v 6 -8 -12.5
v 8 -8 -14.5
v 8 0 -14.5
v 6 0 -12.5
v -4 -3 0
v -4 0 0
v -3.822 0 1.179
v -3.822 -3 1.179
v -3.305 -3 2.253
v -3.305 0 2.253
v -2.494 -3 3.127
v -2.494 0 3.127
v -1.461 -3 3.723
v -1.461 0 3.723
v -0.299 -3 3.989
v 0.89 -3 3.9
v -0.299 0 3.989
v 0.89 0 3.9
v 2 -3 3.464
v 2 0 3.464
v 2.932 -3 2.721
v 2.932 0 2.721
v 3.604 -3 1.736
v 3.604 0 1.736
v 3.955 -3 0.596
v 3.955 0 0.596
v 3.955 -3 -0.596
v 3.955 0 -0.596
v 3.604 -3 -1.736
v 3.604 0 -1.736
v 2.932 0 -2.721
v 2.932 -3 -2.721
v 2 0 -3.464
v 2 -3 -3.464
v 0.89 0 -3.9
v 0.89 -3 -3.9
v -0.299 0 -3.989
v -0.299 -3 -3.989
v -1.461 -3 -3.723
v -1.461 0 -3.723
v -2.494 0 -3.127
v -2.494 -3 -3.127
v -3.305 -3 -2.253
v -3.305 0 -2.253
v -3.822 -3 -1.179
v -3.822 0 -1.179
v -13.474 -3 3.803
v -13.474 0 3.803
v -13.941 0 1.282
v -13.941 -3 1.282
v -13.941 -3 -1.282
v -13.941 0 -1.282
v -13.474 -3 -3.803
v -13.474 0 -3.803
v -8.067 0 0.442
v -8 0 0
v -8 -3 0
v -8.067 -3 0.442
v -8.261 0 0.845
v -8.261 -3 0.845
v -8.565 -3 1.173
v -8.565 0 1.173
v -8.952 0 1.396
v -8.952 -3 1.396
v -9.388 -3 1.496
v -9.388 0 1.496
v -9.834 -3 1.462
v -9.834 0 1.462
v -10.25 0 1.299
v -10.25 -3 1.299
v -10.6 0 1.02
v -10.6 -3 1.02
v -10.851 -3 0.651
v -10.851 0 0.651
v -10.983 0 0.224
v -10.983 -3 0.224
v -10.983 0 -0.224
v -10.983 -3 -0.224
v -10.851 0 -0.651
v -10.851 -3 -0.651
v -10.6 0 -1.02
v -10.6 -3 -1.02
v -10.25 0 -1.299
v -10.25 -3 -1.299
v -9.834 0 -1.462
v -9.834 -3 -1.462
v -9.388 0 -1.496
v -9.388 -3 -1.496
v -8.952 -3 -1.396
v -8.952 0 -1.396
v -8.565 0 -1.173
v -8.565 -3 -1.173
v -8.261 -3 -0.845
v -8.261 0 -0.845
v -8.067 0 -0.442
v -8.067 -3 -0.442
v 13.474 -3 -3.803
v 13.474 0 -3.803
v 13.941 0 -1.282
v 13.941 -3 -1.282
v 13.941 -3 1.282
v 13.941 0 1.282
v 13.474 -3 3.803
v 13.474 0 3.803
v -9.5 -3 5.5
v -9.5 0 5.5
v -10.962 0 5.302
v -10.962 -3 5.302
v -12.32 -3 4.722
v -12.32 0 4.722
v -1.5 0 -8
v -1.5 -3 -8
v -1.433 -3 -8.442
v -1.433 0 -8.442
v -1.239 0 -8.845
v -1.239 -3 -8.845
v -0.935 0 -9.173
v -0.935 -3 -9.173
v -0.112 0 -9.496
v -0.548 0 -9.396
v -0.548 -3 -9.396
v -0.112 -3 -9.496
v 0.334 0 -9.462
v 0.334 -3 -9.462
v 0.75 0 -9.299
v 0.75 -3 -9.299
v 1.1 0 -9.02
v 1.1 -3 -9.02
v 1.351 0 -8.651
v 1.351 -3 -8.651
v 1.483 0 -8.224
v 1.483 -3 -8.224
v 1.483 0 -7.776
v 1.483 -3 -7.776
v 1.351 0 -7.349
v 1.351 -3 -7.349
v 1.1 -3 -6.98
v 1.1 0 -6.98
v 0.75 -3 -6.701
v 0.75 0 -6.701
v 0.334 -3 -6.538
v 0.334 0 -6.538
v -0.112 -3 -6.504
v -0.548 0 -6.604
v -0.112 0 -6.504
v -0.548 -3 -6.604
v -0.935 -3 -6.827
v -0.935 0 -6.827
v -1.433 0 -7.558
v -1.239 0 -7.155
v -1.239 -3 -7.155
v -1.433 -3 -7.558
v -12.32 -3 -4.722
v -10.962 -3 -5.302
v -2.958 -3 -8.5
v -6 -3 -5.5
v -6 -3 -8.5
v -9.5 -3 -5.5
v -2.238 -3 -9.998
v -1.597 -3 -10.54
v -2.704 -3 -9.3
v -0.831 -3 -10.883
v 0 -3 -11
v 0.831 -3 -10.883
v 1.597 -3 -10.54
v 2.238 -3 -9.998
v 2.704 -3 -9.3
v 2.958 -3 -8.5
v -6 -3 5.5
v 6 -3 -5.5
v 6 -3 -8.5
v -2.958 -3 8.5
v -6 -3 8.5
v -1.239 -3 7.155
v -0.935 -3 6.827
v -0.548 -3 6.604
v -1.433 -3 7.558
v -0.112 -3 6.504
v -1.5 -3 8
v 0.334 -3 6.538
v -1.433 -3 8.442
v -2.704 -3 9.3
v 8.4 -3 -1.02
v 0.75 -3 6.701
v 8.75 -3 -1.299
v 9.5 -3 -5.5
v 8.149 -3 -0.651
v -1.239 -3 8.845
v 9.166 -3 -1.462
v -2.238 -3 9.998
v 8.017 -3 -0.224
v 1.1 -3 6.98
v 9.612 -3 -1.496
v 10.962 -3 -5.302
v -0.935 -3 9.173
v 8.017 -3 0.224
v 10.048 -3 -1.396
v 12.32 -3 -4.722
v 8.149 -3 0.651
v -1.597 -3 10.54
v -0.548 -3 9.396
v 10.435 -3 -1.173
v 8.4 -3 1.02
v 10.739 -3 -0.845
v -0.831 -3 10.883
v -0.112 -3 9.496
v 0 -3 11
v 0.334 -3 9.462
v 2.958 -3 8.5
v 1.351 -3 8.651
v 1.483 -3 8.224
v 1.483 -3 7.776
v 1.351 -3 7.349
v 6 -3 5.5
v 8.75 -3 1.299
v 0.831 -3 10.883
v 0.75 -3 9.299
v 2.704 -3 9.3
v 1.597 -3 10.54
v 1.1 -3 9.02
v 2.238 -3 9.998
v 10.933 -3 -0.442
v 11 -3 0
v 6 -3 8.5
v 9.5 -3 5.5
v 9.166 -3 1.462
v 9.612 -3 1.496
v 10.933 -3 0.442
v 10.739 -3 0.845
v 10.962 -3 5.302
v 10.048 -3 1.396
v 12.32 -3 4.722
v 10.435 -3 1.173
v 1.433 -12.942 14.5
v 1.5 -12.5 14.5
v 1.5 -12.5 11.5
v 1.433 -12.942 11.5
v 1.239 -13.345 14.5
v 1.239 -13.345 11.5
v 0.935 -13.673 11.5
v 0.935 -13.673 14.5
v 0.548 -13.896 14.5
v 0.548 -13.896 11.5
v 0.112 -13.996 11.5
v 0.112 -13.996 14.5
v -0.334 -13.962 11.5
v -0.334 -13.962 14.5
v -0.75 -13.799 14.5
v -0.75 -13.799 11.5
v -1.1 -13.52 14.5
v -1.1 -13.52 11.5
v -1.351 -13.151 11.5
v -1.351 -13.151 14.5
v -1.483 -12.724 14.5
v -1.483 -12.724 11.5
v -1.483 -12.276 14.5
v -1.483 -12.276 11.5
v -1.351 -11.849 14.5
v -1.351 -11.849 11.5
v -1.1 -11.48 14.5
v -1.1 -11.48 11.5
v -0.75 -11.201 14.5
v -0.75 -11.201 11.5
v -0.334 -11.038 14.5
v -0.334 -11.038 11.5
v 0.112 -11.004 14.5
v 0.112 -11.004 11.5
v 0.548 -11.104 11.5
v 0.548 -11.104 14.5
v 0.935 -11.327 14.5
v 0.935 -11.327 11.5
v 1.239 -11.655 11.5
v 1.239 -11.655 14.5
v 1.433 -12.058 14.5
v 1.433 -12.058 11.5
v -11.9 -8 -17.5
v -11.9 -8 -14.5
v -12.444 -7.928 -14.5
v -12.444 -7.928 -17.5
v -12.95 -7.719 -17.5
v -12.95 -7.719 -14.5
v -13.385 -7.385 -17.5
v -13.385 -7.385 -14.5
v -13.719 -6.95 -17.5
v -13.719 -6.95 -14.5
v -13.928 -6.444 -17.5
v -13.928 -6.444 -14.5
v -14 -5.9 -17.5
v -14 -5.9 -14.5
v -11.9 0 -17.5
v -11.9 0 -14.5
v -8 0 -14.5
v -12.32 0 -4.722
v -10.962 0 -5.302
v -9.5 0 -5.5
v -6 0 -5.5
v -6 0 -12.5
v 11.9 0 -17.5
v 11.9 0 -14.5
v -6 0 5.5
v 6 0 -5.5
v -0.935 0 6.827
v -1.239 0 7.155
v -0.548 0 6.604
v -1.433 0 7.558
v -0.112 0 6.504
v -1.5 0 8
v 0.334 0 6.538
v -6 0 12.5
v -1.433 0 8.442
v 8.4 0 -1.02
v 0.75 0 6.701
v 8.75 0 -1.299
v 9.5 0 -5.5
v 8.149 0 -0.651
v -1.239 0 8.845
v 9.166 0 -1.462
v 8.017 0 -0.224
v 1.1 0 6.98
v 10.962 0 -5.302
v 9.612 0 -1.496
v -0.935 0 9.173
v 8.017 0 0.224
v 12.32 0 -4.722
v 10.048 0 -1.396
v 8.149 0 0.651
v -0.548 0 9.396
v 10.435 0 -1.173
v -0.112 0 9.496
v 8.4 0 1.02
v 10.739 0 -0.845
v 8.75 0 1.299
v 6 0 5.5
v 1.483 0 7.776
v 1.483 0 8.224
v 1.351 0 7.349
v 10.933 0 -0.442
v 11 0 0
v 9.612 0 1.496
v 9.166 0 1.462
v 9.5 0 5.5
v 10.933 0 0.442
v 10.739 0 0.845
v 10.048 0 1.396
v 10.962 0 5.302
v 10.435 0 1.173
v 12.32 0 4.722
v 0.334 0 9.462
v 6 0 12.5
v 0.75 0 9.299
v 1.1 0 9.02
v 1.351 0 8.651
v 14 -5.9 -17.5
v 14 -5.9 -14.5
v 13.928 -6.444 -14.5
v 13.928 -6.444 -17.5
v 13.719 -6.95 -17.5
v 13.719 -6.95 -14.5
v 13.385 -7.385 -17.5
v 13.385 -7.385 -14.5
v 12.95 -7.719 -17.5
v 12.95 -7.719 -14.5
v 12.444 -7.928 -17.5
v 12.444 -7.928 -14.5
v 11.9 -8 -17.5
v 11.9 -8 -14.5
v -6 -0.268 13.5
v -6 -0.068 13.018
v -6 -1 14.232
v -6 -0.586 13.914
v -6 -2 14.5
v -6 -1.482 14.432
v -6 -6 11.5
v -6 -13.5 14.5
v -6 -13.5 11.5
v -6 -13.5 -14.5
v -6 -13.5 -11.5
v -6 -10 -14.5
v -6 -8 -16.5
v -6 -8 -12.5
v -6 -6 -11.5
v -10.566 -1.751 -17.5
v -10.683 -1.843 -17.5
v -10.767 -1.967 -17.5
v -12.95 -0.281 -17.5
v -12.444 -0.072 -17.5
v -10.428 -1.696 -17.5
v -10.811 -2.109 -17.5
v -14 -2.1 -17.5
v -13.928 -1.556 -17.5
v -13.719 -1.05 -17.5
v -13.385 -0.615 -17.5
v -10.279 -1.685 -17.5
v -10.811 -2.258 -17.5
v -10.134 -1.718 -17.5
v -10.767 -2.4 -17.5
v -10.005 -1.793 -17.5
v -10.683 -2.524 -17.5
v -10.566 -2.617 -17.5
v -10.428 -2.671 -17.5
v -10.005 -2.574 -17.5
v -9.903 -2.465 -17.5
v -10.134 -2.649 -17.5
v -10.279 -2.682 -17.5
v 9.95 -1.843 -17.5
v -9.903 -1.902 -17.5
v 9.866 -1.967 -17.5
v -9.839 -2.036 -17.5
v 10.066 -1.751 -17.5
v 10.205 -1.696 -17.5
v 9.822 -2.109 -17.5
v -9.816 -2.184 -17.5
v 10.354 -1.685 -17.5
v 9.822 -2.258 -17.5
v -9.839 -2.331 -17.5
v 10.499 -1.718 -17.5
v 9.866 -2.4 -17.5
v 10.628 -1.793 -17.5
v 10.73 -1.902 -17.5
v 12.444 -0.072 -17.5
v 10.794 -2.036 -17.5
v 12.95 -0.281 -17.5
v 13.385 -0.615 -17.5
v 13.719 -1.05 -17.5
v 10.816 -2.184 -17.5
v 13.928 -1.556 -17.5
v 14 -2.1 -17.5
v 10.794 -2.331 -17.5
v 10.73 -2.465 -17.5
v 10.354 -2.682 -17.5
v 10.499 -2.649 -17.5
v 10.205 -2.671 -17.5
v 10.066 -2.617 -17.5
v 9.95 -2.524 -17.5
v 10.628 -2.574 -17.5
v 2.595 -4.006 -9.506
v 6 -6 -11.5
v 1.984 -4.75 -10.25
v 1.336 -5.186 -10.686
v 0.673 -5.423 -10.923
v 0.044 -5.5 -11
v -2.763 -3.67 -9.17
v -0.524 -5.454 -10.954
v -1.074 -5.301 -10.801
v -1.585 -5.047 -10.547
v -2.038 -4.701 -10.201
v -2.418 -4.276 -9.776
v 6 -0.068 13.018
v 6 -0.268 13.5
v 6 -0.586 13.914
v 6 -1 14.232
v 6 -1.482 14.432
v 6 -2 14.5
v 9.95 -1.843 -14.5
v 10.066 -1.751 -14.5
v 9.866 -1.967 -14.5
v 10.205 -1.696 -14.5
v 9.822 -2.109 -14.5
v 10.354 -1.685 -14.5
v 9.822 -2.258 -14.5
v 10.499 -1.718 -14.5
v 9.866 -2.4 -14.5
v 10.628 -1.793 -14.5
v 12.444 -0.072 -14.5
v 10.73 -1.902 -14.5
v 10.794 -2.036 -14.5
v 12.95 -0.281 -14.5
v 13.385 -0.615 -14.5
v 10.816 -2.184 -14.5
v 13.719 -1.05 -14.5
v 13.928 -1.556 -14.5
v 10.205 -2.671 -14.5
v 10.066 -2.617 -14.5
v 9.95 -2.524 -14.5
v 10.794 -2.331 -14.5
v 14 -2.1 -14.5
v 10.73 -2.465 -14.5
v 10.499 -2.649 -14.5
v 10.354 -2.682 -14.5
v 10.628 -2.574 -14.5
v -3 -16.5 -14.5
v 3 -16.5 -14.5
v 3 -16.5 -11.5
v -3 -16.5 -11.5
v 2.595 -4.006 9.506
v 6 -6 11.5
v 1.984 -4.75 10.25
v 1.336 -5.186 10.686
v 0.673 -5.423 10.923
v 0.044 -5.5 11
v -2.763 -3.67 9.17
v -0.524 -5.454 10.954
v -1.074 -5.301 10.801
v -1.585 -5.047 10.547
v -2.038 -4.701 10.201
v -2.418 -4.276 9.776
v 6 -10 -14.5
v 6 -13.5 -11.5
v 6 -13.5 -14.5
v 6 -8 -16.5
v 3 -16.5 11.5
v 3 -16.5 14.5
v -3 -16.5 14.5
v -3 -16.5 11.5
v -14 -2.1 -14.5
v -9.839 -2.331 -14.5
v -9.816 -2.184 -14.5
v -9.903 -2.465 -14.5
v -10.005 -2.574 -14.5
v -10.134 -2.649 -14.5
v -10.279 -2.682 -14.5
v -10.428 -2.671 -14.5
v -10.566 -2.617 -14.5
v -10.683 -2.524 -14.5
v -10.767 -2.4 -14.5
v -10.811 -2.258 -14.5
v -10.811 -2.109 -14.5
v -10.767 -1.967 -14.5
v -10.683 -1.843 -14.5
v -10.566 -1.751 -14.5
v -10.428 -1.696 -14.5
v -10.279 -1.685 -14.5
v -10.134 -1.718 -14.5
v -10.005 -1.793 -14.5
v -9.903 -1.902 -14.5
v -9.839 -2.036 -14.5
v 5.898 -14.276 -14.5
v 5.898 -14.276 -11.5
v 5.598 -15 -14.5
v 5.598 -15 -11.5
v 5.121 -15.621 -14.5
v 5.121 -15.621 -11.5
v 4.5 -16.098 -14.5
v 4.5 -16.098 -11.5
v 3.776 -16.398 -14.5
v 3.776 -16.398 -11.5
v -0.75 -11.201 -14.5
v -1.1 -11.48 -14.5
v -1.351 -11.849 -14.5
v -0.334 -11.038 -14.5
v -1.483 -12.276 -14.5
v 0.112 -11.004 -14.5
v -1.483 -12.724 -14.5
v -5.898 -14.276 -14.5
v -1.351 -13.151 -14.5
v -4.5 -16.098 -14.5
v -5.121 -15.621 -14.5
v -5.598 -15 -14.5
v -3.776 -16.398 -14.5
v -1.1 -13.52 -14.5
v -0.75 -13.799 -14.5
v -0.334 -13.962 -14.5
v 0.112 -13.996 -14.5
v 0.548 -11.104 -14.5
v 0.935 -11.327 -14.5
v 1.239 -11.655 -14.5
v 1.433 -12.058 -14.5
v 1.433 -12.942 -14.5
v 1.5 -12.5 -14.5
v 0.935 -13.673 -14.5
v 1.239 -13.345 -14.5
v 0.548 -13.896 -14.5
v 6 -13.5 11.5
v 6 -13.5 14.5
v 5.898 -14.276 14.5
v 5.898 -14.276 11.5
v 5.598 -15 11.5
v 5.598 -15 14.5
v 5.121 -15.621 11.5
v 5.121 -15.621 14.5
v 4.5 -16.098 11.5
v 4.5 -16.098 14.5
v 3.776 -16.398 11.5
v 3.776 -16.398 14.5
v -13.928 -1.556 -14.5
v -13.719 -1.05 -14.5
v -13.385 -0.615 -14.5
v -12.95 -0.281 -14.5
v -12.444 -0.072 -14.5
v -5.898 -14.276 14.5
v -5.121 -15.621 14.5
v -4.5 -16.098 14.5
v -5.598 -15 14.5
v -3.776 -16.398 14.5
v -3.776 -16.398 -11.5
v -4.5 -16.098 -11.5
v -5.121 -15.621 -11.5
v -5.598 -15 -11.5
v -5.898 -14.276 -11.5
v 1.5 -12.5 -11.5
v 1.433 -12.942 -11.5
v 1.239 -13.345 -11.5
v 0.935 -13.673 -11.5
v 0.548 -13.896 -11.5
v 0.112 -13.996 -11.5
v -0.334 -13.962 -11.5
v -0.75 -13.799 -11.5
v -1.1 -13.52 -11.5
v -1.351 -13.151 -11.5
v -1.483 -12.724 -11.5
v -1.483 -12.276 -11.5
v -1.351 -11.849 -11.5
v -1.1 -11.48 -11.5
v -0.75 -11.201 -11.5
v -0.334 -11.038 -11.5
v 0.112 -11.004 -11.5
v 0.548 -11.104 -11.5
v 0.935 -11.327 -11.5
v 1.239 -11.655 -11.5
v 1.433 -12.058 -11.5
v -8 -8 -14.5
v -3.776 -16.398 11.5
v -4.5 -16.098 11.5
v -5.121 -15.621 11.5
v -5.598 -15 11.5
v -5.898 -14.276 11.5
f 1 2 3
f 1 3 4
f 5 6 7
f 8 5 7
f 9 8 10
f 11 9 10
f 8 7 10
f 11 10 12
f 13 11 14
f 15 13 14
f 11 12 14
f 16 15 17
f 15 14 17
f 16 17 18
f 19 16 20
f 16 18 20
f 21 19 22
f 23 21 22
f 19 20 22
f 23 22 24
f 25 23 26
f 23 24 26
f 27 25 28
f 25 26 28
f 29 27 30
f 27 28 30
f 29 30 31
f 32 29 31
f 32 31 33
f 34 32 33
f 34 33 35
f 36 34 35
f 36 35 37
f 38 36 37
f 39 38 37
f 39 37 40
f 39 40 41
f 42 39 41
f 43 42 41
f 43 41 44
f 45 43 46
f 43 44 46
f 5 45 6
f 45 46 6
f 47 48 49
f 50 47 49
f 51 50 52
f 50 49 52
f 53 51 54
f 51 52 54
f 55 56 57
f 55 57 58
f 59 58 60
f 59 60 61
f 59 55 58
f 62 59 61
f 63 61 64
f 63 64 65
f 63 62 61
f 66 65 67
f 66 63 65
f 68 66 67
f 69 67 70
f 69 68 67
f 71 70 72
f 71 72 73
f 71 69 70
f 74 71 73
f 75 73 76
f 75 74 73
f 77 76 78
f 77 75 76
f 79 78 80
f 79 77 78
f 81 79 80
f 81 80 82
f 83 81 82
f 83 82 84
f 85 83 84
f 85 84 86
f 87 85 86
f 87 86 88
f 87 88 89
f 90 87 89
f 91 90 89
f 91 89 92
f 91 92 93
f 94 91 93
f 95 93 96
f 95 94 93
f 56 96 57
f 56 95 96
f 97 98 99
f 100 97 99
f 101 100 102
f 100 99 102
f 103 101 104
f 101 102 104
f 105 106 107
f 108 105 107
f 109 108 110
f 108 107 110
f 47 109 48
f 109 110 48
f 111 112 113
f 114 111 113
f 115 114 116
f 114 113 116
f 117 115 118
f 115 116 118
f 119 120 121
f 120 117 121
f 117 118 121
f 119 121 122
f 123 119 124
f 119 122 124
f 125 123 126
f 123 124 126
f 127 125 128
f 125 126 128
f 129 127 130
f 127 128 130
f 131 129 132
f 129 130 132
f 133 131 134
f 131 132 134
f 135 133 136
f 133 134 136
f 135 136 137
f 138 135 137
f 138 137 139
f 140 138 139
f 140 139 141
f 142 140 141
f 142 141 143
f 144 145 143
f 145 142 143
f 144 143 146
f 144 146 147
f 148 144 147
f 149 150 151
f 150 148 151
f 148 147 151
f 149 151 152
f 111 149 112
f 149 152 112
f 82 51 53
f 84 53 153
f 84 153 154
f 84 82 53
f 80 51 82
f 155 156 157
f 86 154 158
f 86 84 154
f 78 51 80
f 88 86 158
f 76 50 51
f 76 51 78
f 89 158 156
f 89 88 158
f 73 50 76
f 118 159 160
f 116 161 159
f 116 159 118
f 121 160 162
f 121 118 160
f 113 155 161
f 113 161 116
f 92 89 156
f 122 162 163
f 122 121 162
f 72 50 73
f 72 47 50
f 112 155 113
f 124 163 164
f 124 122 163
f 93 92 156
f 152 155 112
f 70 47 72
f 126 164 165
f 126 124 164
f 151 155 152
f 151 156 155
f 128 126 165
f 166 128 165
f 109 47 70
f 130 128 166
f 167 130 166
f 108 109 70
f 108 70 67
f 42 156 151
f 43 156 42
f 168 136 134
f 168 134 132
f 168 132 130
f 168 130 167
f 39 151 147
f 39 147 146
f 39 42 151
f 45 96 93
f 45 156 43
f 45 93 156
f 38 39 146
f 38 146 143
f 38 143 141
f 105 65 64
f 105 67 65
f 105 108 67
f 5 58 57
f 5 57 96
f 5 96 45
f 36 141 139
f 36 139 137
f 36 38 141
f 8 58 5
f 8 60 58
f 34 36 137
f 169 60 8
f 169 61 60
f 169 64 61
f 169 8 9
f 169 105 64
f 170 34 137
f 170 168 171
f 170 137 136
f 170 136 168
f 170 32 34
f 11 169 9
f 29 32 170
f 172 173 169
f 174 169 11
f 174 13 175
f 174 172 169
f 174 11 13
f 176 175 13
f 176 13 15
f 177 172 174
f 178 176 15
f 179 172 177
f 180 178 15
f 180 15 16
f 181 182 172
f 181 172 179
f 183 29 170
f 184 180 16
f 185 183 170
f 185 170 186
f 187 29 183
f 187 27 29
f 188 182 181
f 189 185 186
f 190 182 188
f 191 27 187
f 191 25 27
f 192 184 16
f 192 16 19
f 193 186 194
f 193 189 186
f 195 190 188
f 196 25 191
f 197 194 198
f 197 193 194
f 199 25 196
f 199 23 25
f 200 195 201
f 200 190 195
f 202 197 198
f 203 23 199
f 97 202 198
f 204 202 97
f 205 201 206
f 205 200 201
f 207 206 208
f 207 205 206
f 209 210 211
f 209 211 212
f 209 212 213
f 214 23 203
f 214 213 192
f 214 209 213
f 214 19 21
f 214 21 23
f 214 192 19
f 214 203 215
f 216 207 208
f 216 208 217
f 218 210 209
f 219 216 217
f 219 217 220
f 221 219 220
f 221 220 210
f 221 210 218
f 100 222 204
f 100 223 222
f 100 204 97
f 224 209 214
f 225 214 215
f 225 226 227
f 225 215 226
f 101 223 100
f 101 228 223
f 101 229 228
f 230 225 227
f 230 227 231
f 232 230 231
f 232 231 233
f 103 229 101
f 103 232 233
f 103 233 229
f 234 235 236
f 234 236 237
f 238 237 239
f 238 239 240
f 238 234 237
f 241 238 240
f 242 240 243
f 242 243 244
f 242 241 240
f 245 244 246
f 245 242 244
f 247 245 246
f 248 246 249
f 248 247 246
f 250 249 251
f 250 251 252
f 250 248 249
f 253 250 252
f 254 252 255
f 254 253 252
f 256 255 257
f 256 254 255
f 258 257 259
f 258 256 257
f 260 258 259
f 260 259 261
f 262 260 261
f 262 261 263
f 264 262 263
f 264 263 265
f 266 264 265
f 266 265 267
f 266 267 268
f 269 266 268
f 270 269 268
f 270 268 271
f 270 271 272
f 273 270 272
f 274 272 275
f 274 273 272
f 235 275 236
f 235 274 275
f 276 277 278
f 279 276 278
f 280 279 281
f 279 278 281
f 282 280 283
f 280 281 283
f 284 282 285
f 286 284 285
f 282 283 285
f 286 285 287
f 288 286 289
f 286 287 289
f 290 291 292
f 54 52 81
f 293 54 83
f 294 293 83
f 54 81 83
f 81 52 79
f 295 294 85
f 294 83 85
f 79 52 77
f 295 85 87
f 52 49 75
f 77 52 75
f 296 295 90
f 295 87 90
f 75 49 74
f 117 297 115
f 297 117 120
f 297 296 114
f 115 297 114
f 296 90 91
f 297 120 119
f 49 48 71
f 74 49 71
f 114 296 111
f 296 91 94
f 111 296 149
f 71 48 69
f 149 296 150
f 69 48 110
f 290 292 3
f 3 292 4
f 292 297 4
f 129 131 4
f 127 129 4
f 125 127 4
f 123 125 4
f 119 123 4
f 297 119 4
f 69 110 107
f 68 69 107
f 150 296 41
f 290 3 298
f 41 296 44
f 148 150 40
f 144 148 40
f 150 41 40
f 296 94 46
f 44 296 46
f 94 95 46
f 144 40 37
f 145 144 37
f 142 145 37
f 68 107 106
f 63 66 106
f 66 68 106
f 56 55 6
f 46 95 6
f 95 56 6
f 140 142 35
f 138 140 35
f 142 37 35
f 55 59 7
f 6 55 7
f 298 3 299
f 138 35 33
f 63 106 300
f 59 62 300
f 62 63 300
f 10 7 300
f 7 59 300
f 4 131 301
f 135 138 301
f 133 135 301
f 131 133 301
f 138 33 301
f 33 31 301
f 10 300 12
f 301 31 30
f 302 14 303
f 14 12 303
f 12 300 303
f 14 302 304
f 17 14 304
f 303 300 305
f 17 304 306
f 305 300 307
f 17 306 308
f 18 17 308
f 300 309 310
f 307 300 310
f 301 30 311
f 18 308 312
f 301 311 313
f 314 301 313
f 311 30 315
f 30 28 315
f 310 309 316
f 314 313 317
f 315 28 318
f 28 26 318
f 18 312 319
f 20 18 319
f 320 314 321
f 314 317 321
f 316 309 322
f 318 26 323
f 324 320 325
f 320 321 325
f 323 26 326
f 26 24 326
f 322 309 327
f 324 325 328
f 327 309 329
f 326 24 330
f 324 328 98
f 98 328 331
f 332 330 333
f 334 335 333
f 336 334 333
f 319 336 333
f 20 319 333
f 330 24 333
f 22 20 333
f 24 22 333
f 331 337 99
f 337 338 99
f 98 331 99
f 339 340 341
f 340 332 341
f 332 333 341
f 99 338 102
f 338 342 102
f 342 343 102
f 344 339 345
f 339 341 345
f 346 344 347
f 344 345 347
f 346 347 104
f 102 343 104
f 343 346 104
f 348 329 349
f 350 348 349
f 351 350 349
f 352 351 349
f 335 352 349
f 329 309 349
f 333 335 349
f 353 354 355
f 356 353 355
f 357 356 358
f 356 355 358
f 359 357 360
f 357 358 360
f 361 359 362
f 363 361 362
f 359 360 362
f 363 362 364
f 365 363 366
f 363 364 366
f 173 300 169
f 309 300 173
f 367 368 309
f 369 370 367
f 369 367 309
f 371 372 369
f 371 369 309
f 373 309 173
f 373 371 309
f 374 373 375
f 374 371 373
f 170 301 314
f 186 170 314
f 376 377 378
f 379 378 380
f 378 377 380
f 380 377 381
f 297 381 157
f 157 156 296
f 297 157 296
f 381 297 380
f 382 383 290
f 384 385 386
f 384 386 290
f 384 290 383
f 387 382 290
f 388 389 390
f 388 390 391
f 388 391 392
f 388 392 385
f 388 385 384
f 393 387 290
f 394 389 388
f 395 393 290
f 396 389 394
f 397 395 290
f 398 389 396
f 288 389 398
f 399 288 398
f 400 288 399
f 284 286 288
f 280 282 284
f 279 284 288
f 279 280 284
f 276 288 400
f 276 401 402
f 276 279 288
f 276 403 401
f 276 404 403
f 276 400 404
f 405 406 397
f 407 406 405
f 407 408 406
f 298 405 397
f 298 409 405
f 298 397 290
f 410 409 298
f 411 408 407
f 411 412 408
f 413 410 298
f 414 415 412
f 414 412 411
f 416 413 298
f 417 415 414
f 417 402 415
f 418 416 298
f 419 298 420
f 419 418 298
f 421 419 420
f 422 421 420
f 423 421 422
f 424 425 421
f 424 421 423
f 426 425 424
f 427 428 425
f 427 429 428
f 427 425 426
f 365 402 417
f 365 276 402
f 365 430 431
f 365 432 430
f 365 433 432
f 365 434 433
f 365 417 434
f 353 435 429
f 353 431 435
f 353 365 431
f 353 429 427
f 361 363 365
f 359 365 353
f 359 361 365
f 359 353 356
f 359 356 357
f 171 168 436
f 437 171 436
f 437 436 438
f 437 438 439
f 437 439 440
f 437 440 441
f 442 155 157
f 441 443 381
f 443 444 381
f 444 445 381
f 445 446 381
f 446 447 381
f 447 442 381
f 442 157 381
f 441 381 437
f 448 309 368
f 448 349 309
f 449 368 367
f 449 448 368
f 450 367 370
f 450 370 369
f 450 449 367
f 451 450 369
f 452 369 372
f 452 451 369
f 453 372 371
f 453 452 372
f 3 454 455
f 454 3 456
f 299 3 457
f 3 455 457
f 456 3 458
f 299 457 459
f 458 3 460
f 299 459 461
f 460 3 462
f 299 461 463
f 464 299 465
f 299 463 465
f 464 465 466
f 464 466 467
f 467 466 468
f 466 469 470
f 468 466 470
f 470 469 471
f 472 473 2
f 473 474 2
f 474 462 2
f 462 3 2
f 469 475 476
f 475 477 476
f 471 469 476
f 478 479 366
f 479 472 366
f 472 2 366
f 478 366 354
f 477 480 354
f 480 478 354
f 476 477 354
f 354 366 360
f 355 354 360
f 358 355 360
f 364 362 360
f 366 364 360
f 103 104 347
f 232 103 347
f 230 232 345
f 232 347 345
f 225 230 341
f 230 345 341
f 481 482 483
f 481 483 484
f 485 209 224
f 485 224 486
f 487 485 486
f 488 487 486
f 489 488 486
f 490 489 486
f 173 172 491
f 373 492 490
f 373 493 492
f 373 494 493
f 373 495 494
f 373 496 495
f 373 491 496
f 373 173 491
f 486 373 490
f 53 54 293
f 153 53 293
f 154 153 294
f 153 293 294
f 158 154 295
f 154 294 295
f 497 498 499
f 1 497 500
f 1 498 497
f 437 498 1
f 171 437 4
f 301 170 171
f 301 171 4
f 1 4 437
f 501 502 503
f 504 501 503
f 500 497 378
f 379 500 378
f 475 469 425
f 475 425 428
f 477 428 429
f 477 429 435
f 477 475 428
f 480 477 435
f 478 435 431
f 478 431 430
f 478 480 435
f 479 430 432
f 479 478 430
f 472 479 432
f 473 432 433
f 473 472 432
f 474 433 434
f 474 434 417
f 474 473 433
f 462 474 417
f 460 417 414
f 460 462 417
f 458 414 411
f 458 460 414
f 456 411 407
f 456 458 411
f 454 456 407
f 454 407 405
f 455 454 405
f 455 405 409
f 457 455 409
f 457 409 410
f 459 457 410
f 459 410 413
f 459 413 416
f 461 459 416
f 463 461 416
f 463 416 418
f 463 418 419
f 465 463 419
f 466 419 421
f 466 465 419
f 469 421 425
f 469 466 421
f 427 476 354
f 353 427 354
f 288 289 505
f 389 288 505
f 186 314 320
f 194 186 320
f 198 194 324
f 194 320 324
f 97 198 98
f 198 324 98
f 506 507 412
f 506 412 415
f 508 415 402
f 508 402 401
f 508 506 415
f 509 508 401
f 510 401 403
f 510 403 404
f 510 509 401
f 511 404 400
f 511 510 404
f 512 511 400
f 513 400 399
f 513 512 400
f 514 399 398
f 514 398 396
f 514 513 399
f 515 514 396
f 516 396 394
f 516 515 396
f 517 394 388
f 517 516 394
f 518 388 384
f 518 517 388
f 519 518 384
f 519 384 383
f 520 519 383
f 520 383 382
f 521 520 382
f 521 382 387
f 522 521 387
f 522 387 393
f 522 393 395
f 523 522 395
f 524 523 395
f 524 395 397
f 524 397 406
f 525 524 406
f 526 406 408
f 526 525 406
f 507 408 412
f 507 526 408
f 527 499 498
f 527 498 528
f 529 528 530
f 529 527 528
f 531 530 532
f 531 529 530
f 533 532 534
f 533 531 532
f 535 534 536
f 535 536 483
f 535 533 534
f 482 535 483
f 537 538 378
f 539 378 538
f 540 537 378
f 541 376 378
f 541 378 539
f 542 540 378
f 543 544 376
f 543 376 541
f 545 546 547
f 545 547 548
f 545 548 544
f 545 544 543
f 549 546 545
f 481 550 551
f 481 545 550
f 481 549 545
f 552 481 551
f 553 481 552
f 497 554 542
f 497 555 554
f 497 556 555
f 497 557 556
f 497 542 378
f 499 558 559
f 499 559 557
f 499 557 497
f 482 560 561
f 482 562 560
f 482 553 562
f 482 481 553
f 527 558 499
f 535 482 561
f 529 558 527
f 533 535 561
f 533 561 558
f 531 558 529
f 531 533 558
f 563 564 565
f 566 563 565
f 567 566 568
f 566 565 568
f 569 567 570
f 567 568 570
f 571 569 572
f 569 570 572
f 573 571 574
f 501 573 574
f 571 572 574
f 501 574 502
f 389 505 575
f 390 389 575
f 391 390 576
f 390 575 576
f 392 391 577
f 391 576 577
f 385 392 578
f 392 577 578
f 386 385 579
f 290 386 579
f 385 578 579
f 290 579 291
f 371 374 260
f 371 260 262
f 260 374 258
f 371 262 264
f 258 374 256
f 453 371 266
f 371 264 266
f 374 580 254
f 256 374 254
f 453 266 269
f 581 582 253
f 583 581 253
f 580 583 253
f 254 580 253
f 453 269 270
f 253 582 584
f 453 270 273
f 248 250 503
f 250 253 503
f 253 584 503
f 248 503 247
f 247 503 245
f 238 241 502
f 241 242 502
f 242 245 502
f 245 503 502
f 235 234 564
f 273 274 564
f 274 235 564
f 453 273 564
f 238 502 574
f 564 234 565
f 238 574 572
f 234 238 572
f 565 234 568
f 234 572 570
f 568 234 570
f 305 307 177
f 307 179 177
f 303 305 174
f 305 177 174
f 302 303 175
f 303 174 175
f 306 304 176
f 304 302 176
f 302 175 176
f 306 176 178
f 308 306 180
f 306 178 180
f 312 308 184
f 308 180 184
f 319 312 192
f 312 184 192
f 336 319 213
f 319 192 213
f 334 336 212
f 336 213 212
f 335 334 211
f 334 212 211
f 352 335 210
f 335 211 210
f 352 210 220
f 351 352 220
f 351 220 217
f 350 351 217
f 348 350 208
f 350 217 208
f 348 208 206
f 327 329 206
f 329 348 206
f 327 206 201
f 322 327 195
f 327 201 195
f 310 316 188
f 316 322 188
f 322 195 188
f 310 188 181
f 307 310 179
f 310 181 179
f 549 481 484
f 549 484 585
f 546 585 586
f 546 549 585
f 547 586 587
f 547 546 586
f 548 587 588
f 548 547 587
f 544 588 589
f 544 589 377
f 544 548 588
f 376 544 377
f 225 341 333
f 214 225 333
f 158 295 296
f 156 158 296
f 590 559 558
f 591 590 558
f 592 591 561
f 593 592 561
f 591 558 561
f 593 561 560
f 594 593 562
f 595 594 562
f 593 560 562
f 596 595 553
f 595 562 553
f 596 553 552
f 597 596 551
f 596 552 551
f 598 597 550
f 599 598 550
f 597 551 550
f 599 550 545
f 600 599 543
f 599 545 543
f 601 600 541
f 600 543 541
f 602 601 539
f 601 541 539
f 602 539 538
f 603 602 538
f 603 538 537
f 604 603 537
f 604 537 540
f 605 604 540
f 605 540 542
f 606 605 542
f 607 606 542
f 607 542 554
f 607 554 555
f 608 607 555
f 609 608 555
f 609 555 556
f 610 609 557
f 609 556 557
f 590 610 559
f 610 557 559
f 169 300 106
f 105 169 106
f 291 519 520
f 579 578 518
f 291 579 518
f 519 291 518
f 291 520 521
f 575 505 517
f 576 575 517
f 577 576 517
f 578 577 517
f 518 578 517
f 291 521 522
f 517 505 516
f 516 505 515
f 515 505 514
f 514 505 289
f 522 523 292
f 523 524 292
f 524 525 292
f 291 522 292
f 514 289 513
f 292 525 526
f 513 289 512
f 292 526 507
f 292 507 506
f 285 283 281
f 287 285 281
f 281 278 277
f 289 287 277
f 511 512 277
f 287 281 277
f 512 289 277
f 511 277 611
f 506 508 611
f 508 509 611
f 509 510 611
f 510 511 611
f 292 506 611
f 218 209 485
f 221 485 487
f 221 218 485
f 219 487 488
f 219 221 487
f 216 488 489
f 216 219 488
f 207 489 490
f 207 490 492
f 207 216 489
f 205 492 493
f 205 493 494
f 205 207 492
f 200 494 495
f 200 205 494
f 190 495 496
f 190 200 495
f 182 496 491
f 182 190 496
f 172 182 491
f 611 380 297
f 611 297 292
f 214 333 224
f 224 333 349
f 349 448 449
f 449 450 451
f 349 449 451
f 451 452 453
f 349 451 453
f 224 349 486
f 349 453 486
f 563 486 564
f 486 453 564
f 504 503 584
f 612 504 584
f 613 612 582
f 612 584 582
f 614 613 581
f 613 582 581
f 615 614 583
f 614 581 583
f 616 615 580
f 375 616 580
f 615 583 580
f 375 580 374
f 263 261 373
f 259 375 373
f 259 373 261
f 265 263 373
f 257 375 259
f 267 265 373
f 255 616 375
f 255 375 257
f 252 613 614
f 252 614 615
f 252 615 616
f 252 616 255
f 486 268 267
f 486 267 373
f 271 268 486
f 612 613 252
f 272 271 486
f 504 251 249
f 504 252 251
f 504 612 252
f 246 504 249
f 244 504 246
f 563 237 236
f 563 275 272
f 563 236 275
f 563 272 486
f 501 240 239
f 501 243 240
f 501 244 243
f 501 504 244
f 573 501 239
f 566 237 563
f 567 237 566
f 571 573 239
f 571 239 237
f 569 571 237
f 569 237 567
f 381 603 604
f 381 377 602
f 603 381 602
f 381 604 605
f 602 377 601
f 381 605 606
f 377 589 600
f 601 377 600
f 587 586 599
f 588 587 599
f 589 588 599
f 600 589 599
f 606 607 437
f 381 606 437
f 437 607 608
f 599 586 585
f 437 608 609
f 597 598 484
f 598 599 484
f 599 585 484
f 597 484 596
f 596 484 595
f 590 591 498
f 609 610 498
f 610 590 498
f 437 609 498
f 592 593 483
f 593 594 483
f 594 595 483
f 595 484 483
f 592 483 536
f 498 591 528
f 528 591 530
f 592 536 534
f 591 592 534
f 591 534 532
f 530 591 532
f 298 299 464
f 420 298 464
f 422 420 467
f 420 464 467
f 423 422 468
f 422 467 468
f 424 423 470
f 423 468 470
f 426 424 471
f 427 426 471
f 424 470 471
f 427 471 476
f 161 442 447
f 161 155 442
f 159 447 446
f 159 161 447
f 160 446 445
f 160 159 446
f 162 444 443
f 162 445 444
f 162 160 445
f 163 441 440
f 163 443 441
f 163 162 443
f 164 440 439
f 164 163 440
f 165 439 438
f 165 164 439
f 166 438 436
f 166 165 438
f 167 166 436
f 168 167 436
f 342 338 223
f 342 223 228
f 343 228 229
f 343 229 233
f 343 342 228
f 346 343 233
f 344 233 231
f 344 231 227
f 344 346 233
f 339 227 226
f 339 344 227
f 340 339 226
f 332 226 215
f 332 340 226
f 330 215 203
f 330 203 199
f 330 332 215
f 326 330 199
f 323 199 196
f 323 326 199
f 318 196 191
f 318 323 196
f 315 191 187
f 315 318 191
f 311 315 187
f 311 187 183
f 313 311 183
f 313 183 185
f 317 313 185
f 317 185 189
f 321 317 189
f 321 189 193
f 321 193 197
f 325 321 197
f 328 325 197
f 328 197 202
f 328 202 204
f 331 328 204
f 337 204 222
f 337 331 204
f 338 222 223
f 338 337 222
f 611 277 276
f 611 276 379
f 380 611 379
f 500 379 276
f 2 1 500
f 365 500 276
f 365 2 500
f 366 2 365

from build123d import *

# Parameters (mm, degrees)
F0_R          = 1.5
F0_R_2        = 4.5
F1_DEPTH      = 3
F2_W          = 12
F2_H          = 29
F3_DEPTH      = 3
F4_R          = 1.5
F5_DEPTH      = 3
F6_R          = 4
F6_R_2        = 1.5
F7_DEPTH      = 3
F9_R          = 2
F10_T4_DEPTH  = 12
F10_S5_R      = 1.5
F10_T6_DEPTH  = 8
F10_T10_DEPTH = 12
F10_S11_R     = 1.5
F10_T12_DEPTH = 8
F11_R         = 3
F12_DEPTH     = 4
F13_R         = 0.5
F14_DEPTH     = 3
F15_T1_DEPTH  = 8
F16_T1_DEPTH  = 8
F17_SIZE      = 2


# Not quite as in the source:
# - a fillet or chamfer that OpenCascade refuses, or shapes differently, is made with other operations: its cross-section is extruded or revolved along the edge and cut away or added


with BuildPart() as f1:
    # F0 (on Front) → F1 (new body)
    with BuildSketch(Plane.XZ):
        with BuildLine():
            Line((0, -5.5), (9.5, -5.5))
            ThreePointArc((9.5, -5.5), (11.6605151609, -5.0578823869), (13.4736842105, -3.8026088144))
            ThreePointArc((13.4736842105, -3.8026088144), (14, 0), (13.4736842105, 3.8026088144))
            ThreePointArc((13.4736842105, 3.8026088144), (11.6605151609, 5.0578823869), (9.5, 5.5))
            Line((9.5, 5.5), (0, 5.5))
            Line((0, 5.5), (-9.5, 5.5))
            ThreePointArc((-9.5, 5.5), (-11.6605151609, 5.0578823869), (-13.4736842105, 3.8026088144))
            ThreePointArc((-13.4736842105, 3.8026088144), (-14, 0), (-13.4736842105, -3.8026088144))
            ThreePointArc((-13.4736842105, -3.8026088144), (-11.6605151609, -5.0578823869), (-9.5, -5.5))
            Line((-9.5, -5.5), (0, -5.5))
        make_face()
        with Locations((-9.5, 0)):
            Circle(F0_R, mode=Mode.SUBTRACT)
        Circle(F0_R_2, mode=Mode.SUBTRACT)
        with Locations((9.5, 0)):
            Circle(F0_R, mode=Mode.SUBTRACT)
    extrude(amount=F1_DEPTH)

    # F2 (on face) → F3 (join)
    with BuildSketch(Plane.XZ.offset(3)):
        Rectangle(F2_W, F2_H)
    extrude(amount=-F3_DEPTH)

    # F4 (on face) → F5 (join)
    with BuildSketch(Plane(origin=(0, 0, -14.5), x_dir=(1, 0, 0), z_dir=(0, 0, -1))):
        with BuildLine():
            Line((-6, 13.5), (-6, 0))
            Line((-6, 0), (6, 0))
            Line((6, 0), (6, 13.5))
            ThreePointArc((6, 13.5), (5.1213203436, 15.6213203436), (3, 16.5))
            Line((3, 16.5), (-3, 16.5))
            ThreePointArc((-3, 16.5), (-5.1213203436, 15.6213203436), (-6, 13.5))
        make_face()
        with Locations((0, 12.5)):
            Circle(F4_R, mode=Mode.SUBTRACT)
    extrude(amount=-F5_DEPTH)

    # F6 (on face) → F7 (cut, through all)
    with BuildSketch(Plane(origin=(0, 0, 0), x_dir=(-1, 0, 0), z_dir=(0, 1, 0))):
        Circle(F6_R)
        with Locations((0, 8)):
            Circle(F6_R_2)
        with Locations((0, -8)):
            Circle(F6_R_2)
    extrude(amount=-F7_DEPTH, mode=Mode.SUBTRACT)

    # F8: F1 across plane


with BuildPart() as f1_1:
    add(f1.part)
    add(f1.part.mirror(Plane.XY))

    # F9
    f9_edges = [f1_1.edges().sort_by_distance(p)[0] for p in [
        (0, 0, 14.5),
    ]]
    fillet(f9_edges, radius=F9_R)

    # F10: chamfer of 3 on 2 edges, made by hand


with BuildPart() as f10_tool2:
    # F10_s3 → F10_t4 (new body)
    with BuildSketch(Plane.YZ.offset(-6)):
        Polygon((-3, 8.5), (-6, 11.5), (-3, 11.5), align=None)
    extrude(amount=F10_T4_DEPTH)

    # F10_s5 → F10_t6 (cut, symmetric)
    with BuildSketch(Plane.XZ.offset(4.5)):
        with Locations((0, 8)):
            Circle(F10_S5_R)
    extrude(amount=F10_T6_DEPTH, both=True, mode=Mode.SUBTRACT)


with BuildPart() as f1_2:
    add(f1_1.part)

    # F10_t1: union F10_tool2
    add(f10_tool2.part)


with BuildPart() as f10_tool8:
    # F10_s9 → F10_t10 (new body)
    with BuildSketch(Plane.YZ.offset(-6)):
        Polygon((-3, -8.5), (-6, -11.5), (-3, -11.5), align=None)
    extrude(amount=F10_T10_DEPTH)

    # F10_s11 → F10_t12 (cut, symmetric)
    with BuildSketch(Plane.XZ.offset(4.5)):
        with Locations((0, -8)):
            Circle(F10_S11_R)
    extrude(amount=F10_T12_DEPTH, both=True, mode=Mode.SUBTRACT)


with BuildPart() as f1_3:
    add(f1_2.part)

    # F10_t7: union F10_tool8
    add(f10_tool8.part)

    # F11 (on face) → F12 (cut)
    with BuildSketch(Plane.XZ.offset(3)):
        with Locations((0, 8)):
            Circle(F11_R)
        with Locations((0, -8)):
            Circle(F11_R)
    extrude(amount=F12_DEPTH, mode=Mode.SUBTRACT)

    # F13 (on face) → F14 (join)
    with BuildSketch(Plane(origin=(0, 0, -14.5), x_dir=(1, 0, 0), z_dir=(0, 0, -1))):
        with BuildLine():
            Line((-11.9, 0), (6, 0))
            Line((6, 0), (6, 8))
            Line((6, 8), (-11.9, 8))
            ThreePointArc((-11.9, 8), (-13.3849242405, 7.3849242405), (-14, 5.9))
            Line((-14, 5.9), (-14, 2.1))
            ThreePointArc((-14, 2.1), (-13.3849242405, 0.6150757595), (-11.9, 0))
        make_face()
        with Locations((-10.3164756671, 2.1835243329)):
            Circle(F13_R, mode=Mode.SUBTRACT)
        with BuildLine():
            Line((6, 8), (6, 0))
            Line((6, 0), (11.9, 0))
            ThreePointArc((11.9, 0), (13.3849242405, 0.6150757595), (14, 2.1))
            Line((14, 2.1), (14, 5.9))
            ThreePointArc((14, 5.9), (13.3849242405, 7.3849242405), (11.9, 8))
            Line((11.9, 8), (6, 8))
        make_face()
        with Locations((10.3164756671, 2.1835243329)):
            Circle(F13_R, mode=Mode.SUBTRACT)
    extrude(amount=F14_DEPTH)

    # F15: chamfer of 2 on 1 edges, made by hand

    # F15_s2 → F15_t1 (join)
    with BuildSketch(Plane.XZ):
        Polygon((-6, -12.5), (-8, -14.5), (-6, -14.5), align=None)
    extrude(amount=F15_T1_DEPTH)

    # F16: chamfer of 2 on 1 edges, made by hand

    # F16_s2 → F16_t1 (join)
    with BuildSketch(Plane.XZ):
        Polygon((8, -14.5), (6, -12.5), (6, -14.5), align=None)
    extrude(amount=F16_T1_DEPTH)

    # F17
    f17_edges = [f1_3.edges().sort_by_distance(p)[0] for p in [
        (0, -8, -14.5),
    ]]
    chamfer(f17_edges, length=F17_SIZE)


solid = f1_3.part
